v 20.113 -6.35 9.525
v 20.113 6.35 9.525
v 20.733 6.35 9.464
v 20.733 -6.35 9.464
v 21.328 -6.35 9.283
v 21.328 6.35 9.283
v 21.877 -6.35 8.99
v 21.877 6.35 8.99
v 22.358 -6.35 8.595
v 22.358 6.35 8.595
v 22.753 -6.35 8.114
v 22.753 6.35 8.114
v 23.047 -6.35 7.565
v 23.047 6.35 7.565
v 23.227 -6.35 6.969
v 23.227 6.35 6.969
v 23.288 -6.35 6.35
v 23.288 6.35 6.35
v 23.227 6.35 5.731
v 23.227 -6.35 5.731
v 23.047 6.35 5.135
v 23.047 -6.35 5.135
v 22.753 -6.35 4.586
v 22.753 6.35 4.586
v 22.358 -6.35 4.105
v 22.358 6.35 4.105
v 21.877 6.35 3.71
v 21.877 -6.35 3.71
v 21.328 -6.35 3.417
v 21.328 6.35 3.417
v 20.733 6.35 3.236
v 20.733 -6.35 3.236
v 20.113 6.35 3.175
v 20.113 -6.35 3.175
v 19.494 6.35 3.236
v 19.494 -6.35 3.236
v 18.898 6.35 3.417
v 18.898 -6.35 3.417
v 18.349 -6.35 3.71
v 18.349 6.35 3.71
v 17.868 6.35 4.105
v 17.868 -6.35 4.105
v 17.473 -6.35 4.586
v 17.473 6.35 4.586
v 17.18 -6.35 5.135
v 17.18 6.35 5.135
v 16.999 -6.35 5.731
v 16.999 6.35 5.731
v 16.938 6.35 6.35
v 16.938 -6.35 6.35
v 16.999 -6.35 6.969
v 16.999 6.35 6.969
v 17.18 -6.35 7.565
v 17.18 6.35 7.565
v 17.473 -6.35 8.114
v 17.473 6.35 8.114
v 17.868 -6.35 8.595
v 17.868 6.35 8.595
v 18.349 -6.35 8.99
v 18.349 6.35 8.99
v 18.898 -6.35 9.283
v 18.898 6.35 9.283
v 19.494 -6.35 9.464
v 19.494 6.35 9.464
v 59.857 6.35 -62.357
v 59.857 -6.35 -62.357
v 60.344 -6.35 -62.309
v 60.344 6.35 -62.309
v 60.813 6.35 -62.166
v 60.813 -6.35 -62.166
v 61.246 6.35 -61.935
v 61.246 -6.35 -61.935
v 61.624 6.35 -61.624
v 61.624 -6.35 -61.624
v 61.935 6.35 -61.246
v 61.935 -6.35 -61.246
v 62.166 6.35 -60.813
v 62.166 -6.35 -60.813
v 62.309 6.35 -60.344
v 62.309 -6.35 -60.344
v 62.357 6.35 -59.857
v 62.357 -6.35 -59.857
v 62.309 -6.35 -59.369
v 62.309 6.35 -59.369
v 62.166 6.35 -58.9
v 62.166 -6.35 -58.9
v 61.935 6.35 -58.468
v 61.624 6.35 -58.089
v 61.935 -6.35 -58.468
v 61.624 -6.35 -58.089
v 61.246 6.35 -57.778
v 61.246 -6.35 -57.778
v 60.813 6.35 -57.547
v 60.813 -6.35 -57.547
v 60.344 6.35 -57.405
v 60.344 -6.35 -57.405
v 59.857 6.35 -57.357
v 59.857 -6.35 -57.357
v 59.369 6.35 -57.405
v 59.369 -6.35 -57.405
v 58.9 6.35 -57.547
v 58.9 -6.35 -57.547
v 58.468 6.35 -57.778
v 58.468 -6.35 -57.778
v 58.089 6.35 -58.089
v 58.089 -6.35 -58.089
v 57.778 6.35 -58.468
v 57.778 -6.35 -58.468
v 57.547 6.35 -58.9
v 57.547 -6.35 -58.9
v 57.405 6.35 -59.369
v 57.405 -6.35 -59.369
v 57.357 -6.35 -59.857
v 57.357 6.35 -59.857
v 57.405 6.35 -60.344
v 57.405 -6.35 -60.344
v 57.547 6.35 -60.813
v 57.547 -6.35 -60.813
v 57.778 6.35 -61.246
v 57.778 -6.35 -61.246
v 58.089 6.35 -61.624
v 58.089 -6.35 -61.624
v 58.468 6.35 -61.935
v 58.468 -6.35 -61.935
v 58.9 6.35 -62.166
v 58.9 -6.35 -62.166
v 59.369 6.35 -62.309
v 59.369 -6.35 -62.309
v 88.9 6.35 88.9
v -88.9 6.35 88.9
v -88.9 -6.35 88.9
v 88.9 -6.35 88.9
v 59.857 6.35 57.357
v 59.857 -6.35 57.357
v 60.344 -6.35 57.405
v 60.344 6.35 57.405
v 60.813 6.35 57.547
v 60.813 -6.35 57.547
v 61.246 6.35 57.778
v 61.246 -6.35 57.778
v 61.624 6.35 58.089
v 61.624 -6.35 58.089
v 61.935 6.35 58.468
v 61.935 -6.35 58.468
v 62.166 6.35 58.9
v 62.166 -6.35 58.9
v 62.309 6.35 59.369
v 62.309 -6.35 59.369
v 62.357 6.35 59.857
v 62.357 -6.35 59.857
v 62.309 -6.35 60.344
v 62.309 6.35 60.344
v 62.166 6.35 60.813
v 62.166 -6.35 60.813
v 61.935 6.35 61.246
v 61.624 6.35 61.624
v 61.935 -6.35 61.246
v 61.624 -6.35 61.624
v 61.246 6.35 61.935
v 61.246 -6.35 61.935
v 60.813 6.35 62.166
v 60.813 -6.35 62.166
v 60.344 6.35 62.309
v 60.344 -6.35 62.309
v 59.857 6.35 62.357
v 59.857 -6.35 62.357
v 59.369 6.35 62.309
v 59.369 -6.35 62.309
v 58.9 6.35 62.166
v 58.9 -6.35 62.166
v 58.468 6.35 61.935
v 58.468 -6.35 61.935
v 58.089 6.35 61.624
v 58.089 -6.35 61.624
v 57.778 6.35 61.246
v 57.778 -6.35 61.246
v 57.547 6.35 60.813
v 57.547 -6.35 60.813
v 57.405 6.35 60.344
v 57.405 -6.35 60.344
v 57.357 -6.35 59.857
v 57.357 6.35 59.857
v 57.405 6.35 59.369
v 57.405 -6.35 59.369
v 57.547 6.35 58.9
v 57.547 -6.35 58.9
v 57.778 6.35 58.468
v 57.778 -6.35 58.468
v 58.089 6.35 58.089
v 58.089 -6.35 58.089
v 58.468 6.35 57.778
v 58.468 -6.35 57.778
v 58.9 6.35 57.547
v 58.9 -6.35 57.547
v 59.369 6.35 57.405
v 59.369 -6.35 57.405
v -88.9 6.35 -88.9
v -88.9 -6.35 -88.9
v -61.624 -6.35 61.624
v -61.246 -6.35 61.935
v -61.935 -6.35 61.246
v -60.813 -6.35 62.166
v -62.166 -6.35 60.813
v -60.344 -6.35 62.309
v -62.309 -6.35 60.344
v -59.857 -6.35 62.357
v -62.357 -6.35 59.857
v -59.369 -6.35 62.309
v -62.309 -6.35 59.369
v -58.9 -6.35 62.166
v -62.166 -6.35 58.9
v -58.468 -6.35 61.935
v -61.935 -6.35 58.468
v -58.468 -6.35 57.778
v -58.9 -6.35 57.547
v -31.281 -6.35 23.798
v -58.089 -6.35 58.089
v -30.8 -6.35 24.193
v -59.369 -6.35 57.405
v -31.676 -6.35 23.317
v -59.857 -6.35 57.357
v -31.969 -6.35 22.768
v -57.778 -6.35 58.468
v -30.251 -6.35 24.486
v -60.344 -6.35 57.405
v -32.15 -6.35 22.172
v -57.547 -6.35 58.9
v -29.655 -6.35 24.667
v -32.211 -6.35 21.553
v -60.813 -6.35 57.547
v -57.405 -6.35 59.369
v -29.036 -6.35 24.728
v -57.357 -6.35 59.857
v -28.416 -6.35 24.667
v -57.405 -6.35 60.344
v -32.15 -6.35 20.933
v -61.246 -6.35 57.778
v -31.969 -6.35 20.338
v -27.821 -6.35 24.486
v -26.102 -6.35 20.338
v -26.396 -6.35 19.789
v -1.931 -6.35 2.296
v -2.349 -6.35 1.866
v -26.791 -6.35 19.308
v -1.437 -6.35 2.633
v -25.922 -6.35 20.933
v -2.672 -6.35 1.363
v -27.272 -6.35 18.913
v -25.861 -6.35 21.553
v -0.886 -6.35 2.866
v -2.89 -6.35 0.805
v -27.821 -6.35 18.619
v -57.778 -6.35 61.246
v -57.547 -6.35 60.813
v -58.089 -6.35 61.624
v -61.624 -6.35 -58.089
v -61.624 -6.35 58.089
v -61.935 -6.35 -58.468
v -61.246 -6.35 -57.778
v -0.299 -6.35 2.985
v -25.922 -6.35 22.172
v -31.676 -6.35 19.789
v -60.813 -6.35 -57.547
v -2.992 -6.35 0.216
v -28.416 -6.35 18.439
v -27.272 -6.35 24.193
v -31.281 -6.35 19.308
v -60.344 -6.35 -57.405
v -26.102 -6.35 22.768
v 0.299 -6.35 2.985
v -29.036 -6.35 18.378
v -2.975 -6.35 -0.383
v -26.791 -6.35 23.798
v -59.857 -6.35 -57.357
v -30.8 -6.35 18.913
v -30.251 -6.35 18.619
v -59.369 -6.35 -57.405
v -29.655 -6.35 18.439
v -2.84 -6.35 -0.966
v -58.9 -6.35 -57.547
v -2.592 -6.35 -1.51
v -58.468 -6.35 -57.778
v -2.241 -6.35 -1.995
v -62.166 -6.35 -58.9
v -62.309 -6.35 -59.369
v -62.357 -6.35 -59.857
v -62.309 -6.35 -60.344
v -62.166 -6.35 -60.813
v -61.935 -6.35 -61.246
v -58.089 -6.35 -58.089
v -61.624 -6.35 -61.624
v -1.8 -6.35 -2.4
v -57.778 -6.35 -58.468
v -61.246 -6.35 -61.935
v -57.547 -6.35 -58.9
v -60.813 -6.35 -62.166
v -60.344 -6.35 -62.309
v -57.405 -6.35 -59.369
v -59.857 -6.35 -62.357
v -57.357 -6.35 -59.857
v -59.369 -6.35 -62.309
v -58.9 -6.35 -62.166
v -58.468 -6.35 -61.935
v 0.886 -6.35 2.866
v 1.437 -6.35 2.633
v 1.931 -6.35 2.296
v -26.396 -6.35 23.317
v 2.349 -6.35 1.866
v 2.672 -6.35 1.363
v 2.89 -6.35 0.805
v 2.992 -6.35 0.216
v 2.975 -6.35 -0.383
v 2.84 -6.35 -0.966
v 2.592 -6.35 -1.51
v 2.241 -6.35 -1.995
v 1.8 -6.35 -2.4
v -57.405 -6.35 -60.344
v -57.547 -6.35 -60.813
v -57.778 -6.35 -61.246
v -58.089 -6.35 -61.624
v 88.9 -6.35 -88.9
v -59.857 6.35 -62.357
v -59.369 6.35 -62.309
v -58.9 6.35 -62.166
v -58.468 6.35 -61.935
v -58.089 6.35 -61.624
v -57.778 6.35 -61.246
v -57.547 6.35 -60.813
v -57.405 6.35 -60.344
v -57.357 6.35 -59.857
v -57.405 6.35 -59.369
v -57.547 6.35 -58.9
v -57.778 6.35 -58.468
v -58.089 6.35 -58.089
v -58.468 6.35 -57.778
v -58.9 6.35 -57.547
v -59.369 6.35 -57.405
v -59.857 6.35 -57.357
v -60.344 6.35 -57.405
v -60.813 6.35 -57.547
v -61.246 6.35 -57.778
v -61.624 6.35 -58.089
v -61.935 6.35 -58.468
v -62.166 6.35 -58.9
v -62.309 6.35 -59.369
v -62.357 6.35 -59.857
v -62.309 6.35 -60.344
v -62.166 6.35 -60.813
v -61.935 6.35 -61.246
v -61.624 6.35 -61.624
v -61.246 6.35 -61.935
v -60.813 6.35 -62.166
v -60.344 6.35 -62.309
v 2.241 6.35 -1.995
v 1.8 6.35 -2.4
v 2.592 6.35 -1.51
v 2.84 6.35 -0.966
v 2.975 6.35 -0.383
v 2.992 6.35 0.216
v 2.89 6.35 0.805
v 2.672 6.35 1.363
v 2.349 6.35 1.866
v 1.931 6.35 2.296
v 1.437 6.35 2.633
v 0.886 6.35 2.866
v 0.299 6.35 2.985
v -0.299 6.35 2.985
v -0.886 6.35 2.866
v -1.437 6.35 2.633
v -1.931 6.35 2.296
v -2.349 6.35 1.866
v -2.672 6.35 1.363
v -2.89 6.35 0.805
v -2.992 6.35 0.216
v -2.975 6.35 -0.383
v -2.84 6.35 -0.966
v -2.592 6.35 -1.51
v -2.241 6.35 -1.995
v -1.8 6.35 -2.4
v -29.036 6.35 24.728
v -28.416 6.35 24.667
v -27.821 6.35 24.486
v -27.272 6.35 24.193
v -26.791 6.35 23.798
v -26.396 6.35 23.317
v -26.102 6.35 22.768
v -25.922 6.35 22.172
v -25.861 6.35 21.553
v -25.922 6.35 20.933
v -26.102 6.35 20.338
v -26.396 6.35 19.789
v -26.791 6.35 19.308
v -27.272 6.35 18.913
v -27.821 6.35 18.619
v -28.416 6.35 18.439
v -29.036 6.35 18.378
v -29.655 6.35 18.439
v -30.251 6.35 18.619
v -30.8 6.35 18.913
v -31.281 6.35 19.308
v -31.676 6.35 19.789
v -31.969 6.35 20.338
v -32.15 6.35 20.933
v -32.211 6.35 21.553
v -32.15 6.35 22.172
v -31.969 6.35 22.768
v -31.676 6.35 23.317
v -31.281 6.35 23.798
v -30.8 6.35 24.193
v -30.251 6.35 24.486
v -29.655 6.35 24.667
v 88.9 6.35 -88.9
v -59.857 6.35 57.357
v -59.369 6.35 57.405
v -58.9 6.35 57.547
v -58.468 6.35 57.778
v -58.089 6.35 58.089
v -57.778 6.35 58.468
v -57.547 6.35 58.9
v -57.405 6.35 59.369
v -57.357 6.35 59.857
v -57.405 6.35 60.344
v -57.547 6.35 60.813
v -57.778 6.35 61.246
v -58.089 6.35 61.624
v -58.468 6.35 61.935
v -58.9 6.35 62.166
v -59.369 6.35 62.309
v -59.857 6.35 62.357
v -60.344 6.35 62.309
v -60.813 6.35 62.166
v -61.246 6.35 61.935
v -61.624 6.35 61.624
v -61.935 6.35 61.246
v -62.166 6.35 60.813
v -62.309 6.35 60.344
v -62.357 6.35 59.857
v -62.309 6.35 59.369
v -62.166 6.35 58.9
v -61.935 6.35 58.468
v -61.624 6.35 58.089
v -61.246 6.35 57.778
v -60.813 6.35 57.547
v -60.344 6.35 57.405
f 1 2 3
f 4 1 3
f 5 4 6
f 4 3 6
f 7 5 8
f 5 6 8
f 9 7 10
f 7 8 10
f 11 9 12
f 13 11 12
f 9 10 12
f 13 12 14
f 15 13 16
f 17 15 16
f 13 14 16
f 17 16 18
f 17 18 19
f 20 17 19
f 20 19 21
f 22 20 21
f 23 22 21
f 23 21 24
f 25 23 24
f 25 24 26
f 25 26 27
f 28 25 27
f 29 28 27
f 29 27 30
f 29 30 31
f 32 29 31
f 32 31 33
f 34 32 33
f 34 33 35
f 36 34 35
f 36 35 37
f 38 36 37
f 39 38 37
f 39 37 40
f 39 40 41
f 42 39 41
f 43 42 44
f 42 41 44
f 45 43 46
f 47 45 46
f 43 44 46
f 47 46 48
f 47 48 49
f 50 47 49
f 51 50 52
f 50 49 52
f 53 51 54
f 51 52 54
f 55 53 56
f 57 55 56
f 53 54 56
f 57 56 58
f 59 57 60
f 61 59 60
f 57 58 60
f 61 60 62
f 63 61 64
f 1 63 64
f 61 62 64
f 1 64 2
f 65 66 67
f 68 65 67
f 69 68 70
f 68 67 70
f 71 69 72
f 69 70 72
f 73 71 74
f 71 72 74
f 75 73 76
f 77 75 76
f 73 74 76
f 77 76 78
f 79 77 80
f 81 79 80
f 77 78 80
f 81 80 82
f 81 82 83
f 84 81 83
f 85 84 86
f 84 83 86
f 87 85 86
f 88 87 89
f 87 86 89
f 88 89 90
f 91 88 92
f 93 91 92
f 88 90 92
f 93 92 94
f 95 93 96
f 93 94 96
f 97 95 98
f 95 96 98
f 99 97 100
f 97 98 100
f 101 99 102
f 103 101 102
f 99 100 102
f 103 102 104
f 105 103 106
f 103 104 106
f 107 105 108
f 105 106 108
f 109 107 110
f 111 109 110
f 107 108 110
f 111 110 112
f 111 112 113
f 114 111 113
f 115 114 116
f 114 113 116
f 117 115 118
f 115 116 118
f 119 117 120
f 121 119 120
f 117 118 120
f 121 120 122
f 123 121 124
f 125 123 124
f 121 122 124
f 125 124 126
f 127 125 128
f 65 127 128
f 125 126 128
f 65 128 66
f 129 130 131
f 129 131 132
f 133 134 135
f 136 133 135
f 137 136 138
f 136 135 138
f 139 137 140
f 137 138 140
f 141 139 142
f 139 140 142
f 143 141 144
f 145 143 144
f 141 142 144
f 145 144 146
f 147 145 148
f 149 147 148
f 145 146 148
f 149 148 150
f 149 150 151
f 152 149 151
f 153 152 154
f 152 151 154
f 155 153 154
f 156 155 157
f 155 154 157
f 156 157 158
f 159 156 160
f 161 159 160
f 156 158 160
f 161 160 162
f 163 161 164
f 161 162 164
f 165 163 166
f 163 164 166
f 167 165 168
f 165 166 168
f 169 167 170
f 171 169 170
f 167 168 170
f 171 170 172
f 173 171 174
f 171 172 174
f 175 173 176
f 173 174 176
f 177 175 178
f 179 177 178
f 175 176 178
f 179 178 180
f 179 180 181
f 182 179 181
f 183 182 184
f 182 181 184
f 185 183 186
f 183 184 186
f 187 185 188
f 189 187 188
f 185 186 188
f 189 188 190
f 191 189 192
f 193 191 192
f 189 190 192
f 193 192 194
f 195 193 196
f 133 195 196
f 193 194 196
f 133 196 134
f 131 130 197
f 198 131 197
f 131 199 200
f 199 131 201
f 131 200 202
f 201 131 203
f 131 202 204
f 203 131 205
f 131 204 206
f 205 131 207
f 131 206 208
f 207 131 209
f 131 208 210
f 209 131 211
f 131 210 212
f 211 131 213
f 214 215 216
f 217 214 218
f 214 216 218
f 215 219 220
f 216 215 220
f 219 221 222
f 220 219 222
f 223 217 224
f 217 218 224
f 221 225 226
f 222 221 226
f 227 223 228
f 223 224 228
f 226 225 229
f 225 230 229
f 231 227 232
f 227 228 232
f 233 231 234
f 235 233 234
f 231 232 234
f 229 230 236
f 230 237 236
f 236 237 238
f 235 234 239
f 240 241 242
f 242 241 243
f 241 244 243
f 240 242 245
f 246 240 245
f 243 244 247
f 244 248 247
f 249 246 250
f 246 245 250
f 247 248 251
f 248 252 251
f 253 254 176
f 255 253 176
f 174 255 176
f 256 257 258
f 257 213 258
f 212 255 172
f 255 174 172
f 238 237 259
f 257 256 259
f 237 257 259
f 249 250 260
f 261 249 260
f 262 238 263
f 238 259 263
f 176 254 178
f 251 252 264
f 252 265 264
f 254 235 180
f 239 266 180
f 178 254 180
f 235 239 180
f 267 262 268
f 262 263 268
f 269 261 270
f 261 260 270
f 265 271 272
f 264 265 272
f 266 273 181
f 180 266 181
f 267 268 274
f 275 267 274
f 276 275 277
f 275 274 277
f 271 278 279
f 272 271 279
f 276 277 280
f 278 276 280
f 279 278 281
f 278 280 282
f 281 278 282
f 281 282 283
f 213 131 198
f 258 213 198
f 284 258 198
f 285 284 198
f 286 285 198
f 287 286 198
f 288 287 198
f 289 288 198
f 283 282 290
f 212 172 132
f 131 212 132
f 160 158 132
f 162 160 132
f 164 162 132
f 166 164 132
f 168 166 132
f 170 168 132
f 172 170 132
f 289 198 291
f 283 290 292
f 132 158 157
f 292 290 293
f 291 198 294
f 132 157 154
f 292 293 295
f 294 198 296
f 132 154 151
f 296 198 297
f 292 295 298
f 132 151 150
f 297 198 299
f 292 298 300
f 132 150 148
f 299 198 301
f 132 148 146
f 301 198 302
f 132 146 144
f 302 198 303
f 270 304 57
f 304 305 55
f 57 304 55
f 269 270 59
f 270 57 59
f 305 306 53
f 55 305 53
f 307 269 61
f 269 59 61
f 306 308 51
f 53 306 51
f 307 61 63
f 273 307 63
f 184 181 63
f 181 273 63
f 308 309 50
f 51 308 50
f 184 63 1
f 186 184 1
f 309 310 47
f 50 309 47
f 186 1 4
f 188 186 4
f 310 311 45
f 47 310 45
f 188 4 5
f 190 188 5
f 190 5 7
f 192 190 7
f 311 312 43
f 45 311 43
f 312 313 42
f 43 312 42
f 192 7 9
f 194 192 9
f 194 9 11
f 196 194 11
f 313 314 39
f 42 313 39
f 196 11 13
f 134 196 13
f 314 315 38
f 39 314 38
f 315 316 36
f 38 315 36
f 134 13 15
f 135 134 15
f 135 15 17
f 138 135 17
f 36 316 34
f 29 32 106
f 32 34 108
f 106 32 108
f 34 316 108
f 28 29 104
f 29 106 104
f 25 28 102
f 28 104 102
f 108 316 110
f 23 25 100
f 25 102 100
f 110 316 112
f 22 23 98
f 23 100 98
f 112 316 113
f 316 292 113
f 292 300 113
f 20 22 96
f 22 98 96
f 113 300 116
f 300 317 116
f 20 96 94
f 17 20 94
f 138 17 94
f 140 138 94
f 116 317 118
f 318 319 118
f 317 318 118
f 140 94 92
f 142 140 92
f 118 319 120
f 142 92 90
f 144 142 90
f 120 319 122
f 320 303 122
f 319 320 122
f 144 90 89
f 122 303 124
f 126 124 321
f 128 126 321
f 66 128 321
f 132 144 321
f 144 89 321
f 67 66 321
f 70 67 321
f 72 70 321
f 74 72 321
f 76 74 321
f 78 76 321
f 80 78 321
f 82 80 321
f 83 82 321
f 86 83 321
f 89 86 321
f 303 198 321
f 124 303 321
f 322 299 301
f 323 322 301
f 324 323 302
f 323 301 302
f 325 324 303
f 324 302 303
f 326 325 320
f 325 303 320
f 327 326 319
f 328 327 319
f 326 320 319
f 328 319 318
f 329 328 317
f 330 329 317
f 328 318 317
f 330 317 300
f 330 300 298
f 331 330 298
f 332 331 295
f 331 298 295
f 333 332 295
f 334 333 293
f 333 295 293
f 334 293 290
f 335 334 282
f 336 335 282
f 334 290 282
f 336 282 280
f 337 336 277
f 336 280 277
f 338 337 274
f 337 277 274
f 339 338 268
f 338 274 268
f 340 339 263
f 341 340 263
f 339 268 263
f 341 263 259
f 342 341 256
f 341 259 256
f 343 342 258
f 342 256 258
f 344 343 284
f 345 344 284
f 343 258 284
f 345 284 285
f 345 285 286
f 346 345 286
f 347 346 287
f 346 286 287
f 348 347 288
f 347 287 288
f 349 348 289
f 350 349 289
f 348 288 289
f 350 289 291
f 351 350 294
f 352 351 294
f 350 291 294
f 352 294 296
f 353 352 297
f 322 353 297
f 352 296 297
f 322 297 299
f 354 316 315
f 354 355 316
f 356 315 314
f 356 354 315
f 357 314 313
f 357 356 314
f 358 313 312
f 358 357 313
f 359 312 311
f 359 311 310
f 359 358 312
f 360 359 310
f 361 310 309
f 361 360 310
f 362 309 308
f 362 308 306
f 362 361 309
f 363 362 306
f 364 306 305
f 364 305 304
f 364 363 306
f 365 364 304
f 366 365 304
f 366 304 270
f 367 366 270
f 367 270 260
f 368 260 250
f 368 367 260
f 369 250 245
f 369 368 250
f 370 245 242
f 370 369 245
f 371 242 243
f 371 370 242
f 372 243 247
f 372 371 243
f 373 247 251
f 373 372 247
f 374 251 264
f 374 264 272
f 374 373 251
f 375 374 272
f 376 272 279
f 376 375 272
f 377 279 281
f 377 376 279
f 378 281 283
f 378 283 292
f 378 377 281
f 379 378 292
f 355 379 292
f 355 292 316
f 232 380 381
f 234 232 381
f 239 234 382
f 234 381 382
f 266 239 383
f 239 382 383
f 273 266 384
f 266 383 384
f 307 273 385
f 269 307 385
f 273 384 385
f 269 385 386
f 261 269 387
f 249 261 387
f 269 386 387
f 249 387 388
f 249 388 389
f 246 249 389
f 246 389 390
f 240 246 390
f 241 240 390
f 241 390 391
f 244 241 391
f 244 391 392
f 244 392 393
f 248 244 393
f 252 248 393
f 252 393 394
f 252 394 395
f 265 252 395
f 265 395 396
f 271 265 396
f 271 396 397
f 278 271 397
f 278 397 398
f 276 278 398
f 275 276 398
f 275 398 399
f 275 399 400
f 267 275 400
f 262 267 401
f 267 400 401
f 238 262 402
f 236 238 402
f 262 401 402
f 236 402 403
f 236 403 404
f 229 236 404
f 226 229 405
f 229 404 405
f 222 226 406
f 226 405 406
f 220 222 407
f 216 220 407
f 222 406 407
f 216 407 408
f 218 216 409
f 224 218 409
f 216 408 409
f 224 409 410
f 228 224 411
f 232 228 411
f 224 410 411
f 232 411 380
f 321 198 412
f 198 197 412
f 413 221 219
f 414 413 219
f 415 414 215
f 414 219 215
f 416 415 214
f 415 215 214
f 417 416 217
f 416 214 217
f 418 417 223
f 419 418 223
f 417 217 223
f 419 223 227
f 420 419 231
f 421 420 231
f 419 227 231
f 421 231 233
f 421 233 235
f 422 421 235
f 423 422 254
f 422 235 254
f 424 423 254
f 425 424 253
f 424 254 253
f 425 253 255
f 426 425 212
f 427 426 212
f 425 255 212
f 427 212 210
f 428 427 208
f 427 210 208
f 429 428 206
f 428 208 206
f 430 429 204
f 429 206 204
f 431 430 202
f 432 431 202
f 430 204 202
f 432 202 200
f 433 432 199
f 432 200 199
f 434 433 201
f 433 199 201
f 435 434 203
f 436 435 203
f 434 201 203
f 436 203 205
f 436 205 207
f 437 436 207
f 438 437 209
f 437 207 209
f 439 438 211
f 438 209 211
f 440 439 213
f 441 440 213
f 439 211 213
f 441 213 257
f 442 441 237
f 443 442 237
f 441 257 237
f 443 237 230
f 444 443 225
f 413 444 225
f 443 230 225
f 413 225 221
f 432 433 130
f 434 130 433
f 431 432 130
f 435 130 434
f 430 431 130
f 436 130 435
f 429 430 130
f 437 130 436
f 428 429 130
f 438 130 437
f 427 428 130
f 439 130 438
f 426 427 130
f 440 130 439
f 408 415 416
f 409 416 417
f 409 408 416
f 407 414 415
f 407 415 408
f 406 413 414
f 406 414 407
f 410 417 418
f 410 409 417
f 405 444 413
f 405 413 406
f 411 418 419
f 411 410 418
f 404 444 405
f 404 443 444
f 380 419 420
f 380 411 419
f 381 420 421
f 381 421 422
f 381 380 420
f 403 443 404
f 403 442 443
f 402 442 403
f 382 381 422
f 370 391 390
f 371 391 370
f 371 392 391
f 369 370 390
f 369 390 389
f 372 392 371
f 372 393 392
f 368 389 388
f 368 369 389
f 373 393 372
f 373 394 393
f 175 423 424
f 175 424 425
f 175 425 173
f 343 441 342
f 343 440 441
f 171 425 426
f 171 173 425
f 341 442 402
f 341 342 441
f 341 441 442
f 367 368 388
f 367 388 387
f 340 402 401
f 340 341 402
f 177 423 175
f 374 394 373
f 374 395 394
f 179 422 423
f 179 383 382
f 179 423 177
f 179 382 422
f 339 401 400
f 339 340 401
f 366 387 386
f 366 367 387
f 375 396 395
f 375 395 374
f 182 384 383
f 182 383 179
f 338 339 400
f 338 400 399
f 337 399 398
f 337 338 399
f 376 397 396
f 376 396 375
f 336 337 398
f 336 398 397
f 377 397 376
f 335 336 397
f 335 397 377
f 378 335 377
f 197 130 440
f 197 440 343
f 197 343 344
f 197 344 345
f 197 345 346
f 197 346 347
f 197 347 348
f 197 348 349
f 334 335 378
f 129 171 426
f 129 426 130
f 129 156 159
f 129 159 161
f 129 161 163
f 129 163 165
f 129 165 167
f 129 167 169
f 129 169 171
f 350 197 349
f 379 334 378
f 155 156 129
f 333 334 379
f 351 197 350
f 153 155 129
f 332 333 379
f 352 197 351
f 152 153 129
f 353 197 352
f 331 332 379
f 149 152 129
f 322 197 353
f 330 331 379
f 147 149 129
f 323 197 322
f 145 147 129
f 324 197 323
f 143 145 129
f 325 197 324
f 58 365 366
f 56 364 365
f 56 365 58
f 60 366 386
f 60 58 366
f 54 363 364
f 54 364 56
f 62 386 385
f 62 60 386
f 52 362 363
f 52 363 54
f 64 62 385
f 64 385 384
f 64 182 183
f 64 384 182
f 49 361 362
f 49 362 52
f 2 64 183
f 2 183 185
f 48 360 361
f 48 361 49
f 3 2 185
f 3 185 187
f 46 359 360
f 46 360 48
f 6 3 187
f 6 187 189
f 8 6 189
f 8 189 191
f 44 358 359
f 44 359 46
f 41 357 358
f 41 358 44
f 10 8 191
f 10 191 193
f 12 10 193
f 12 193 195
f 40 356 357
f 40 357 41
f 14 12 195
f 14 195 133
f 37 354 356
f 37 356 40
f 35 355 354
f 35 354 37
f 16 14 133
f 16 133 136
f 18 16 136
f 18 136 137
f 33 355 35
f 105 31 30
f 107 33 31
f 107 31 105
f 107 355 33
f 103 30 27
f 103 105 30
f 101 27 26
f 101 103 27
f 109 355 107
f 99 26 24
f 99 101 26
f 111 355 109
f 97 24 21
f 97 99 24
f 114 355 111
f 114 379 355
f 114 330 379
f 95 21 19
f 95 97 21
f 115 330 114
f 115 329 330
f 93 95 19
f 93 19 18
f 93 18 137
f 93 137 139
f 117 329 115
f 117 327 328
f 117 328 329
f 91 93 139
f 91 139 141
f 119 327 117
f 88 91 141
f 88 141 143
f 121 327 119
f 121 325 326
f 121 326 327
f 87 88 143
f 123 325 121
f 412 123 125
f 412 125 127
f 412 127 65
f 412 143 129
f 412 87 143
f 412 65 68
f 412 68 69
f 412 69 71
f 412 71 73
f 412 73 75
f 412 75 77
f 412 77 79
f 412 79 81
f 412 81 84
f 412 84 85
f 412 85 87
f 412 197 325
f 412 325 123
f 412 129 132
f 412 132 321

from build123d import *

# Parameters (mm, degrees)
SKETCH2_W           = 177.8
SKETCH2_H           = 177.8
BOSS_EXTRUDE1_DEPTH = 6.35
SKETCH3_R           = 2.5
CUT_EXTRUDE1_DEPTH  = 12.7
CUT_EXTRUDE2_REACH  = 128.363
SKETCH5_R           = 3.175


with BuildPart() as part:
    # Sketch2 → Boss-Extrude1 (new, symmetric)
    with BuildSketch(Plane(origin=(0, 0, 0), x_dir=(1, 0, 0), z_dir=(0, 1, 0))):
        Rectangle(SKETCH2_W, SKETCH2_H)
        with BuildLine():
            Line((-1.8, 2.4), (1.8, 2.4))
            ThreePointArc((1.8, 2.4), (0, -3), (-1.8, 2.4))
        make_face(mode=Mode.SUBTRACT)
    extrude(amount=BOSS_EXTRUDE1_DEPTH, both=True)

    # Sketch3 → Cut-Extrude1 (cut)
    with BuildSketch(Plane.XZ.offset(6.35)):
        with Locations(Location((-59.856589027, -59.856589027, 0), (0, 0, 270))):
            Circle(SKETCH3_R)
        with Locations(Location((59.856589027, -59.856589027, 0), (0, 0, 270))):
            Circle(SKETCH3_R)
        with Locations(Location((59.856589027, 59.856589027, 0), (0, 0, 270))):
            Circle(SKETCH3_R)
        with Locations(Location((-59.856589027, 59.856589027, 0), (0, 0, 270))):
            Circle(SKETCH3_R)
    extrude(amount=-CUT_EXTRUDE1_DEPTH, mode=Mode.SUBTRACT)

    # Sketch5 → Cut-Extrude2 (cut, up to next)
    with BuildSketch(Plane(origin=(0, 6.35, 0), x_dir=(1, 0, 0), z_dir=(0, 1, 0)), mode=Mode.PRIVATE) as cut_extrude2_sk1:
        with Locations(Location((20.113342208, -6.35, 0), (0, 0, 270))):
            Circle(SKETCH5_R)
    cut_extrude2_tool1 = extrude(cut_extrude2_sk1.sketch, amount=-CUT_EXTRUDE2_REACH, mode=Mode.PRIVATE) & part.part
    # Sketch5 → Cut-Extrude2 (cut, up to next)
    with BuildSketch(Plane(origin=(0, 6.35, 0), x_dir=(1, 0, 0), z_dir=(0, 1, 0)), mode=Mode.PRIVATE) as cut_extrude2_sk2:
        with Locations(Location((-29.035657792, -21.552614691, 0), (0, 0, 270))):
            Circle(SKETCH5_R)
    cut_extrude2_tool2 = extrude(cut_extrude2_sk2.sketch, amount=-CUT_EXTRUDE2_REACH, mode=Mode.PRIVATE) & part.part
    add(cut_extrude2_tool1.solids().sort_by_distance((20.113342, 6.35, 6.35))[0], mode=Mode.SUBTRACT)
    add(cut_extrude2_tool2.solids().sort_by_distance((-29.035658, 6.35, 21.552615))[0], mode=Mode.SUBTRACT)


solid = part.part
